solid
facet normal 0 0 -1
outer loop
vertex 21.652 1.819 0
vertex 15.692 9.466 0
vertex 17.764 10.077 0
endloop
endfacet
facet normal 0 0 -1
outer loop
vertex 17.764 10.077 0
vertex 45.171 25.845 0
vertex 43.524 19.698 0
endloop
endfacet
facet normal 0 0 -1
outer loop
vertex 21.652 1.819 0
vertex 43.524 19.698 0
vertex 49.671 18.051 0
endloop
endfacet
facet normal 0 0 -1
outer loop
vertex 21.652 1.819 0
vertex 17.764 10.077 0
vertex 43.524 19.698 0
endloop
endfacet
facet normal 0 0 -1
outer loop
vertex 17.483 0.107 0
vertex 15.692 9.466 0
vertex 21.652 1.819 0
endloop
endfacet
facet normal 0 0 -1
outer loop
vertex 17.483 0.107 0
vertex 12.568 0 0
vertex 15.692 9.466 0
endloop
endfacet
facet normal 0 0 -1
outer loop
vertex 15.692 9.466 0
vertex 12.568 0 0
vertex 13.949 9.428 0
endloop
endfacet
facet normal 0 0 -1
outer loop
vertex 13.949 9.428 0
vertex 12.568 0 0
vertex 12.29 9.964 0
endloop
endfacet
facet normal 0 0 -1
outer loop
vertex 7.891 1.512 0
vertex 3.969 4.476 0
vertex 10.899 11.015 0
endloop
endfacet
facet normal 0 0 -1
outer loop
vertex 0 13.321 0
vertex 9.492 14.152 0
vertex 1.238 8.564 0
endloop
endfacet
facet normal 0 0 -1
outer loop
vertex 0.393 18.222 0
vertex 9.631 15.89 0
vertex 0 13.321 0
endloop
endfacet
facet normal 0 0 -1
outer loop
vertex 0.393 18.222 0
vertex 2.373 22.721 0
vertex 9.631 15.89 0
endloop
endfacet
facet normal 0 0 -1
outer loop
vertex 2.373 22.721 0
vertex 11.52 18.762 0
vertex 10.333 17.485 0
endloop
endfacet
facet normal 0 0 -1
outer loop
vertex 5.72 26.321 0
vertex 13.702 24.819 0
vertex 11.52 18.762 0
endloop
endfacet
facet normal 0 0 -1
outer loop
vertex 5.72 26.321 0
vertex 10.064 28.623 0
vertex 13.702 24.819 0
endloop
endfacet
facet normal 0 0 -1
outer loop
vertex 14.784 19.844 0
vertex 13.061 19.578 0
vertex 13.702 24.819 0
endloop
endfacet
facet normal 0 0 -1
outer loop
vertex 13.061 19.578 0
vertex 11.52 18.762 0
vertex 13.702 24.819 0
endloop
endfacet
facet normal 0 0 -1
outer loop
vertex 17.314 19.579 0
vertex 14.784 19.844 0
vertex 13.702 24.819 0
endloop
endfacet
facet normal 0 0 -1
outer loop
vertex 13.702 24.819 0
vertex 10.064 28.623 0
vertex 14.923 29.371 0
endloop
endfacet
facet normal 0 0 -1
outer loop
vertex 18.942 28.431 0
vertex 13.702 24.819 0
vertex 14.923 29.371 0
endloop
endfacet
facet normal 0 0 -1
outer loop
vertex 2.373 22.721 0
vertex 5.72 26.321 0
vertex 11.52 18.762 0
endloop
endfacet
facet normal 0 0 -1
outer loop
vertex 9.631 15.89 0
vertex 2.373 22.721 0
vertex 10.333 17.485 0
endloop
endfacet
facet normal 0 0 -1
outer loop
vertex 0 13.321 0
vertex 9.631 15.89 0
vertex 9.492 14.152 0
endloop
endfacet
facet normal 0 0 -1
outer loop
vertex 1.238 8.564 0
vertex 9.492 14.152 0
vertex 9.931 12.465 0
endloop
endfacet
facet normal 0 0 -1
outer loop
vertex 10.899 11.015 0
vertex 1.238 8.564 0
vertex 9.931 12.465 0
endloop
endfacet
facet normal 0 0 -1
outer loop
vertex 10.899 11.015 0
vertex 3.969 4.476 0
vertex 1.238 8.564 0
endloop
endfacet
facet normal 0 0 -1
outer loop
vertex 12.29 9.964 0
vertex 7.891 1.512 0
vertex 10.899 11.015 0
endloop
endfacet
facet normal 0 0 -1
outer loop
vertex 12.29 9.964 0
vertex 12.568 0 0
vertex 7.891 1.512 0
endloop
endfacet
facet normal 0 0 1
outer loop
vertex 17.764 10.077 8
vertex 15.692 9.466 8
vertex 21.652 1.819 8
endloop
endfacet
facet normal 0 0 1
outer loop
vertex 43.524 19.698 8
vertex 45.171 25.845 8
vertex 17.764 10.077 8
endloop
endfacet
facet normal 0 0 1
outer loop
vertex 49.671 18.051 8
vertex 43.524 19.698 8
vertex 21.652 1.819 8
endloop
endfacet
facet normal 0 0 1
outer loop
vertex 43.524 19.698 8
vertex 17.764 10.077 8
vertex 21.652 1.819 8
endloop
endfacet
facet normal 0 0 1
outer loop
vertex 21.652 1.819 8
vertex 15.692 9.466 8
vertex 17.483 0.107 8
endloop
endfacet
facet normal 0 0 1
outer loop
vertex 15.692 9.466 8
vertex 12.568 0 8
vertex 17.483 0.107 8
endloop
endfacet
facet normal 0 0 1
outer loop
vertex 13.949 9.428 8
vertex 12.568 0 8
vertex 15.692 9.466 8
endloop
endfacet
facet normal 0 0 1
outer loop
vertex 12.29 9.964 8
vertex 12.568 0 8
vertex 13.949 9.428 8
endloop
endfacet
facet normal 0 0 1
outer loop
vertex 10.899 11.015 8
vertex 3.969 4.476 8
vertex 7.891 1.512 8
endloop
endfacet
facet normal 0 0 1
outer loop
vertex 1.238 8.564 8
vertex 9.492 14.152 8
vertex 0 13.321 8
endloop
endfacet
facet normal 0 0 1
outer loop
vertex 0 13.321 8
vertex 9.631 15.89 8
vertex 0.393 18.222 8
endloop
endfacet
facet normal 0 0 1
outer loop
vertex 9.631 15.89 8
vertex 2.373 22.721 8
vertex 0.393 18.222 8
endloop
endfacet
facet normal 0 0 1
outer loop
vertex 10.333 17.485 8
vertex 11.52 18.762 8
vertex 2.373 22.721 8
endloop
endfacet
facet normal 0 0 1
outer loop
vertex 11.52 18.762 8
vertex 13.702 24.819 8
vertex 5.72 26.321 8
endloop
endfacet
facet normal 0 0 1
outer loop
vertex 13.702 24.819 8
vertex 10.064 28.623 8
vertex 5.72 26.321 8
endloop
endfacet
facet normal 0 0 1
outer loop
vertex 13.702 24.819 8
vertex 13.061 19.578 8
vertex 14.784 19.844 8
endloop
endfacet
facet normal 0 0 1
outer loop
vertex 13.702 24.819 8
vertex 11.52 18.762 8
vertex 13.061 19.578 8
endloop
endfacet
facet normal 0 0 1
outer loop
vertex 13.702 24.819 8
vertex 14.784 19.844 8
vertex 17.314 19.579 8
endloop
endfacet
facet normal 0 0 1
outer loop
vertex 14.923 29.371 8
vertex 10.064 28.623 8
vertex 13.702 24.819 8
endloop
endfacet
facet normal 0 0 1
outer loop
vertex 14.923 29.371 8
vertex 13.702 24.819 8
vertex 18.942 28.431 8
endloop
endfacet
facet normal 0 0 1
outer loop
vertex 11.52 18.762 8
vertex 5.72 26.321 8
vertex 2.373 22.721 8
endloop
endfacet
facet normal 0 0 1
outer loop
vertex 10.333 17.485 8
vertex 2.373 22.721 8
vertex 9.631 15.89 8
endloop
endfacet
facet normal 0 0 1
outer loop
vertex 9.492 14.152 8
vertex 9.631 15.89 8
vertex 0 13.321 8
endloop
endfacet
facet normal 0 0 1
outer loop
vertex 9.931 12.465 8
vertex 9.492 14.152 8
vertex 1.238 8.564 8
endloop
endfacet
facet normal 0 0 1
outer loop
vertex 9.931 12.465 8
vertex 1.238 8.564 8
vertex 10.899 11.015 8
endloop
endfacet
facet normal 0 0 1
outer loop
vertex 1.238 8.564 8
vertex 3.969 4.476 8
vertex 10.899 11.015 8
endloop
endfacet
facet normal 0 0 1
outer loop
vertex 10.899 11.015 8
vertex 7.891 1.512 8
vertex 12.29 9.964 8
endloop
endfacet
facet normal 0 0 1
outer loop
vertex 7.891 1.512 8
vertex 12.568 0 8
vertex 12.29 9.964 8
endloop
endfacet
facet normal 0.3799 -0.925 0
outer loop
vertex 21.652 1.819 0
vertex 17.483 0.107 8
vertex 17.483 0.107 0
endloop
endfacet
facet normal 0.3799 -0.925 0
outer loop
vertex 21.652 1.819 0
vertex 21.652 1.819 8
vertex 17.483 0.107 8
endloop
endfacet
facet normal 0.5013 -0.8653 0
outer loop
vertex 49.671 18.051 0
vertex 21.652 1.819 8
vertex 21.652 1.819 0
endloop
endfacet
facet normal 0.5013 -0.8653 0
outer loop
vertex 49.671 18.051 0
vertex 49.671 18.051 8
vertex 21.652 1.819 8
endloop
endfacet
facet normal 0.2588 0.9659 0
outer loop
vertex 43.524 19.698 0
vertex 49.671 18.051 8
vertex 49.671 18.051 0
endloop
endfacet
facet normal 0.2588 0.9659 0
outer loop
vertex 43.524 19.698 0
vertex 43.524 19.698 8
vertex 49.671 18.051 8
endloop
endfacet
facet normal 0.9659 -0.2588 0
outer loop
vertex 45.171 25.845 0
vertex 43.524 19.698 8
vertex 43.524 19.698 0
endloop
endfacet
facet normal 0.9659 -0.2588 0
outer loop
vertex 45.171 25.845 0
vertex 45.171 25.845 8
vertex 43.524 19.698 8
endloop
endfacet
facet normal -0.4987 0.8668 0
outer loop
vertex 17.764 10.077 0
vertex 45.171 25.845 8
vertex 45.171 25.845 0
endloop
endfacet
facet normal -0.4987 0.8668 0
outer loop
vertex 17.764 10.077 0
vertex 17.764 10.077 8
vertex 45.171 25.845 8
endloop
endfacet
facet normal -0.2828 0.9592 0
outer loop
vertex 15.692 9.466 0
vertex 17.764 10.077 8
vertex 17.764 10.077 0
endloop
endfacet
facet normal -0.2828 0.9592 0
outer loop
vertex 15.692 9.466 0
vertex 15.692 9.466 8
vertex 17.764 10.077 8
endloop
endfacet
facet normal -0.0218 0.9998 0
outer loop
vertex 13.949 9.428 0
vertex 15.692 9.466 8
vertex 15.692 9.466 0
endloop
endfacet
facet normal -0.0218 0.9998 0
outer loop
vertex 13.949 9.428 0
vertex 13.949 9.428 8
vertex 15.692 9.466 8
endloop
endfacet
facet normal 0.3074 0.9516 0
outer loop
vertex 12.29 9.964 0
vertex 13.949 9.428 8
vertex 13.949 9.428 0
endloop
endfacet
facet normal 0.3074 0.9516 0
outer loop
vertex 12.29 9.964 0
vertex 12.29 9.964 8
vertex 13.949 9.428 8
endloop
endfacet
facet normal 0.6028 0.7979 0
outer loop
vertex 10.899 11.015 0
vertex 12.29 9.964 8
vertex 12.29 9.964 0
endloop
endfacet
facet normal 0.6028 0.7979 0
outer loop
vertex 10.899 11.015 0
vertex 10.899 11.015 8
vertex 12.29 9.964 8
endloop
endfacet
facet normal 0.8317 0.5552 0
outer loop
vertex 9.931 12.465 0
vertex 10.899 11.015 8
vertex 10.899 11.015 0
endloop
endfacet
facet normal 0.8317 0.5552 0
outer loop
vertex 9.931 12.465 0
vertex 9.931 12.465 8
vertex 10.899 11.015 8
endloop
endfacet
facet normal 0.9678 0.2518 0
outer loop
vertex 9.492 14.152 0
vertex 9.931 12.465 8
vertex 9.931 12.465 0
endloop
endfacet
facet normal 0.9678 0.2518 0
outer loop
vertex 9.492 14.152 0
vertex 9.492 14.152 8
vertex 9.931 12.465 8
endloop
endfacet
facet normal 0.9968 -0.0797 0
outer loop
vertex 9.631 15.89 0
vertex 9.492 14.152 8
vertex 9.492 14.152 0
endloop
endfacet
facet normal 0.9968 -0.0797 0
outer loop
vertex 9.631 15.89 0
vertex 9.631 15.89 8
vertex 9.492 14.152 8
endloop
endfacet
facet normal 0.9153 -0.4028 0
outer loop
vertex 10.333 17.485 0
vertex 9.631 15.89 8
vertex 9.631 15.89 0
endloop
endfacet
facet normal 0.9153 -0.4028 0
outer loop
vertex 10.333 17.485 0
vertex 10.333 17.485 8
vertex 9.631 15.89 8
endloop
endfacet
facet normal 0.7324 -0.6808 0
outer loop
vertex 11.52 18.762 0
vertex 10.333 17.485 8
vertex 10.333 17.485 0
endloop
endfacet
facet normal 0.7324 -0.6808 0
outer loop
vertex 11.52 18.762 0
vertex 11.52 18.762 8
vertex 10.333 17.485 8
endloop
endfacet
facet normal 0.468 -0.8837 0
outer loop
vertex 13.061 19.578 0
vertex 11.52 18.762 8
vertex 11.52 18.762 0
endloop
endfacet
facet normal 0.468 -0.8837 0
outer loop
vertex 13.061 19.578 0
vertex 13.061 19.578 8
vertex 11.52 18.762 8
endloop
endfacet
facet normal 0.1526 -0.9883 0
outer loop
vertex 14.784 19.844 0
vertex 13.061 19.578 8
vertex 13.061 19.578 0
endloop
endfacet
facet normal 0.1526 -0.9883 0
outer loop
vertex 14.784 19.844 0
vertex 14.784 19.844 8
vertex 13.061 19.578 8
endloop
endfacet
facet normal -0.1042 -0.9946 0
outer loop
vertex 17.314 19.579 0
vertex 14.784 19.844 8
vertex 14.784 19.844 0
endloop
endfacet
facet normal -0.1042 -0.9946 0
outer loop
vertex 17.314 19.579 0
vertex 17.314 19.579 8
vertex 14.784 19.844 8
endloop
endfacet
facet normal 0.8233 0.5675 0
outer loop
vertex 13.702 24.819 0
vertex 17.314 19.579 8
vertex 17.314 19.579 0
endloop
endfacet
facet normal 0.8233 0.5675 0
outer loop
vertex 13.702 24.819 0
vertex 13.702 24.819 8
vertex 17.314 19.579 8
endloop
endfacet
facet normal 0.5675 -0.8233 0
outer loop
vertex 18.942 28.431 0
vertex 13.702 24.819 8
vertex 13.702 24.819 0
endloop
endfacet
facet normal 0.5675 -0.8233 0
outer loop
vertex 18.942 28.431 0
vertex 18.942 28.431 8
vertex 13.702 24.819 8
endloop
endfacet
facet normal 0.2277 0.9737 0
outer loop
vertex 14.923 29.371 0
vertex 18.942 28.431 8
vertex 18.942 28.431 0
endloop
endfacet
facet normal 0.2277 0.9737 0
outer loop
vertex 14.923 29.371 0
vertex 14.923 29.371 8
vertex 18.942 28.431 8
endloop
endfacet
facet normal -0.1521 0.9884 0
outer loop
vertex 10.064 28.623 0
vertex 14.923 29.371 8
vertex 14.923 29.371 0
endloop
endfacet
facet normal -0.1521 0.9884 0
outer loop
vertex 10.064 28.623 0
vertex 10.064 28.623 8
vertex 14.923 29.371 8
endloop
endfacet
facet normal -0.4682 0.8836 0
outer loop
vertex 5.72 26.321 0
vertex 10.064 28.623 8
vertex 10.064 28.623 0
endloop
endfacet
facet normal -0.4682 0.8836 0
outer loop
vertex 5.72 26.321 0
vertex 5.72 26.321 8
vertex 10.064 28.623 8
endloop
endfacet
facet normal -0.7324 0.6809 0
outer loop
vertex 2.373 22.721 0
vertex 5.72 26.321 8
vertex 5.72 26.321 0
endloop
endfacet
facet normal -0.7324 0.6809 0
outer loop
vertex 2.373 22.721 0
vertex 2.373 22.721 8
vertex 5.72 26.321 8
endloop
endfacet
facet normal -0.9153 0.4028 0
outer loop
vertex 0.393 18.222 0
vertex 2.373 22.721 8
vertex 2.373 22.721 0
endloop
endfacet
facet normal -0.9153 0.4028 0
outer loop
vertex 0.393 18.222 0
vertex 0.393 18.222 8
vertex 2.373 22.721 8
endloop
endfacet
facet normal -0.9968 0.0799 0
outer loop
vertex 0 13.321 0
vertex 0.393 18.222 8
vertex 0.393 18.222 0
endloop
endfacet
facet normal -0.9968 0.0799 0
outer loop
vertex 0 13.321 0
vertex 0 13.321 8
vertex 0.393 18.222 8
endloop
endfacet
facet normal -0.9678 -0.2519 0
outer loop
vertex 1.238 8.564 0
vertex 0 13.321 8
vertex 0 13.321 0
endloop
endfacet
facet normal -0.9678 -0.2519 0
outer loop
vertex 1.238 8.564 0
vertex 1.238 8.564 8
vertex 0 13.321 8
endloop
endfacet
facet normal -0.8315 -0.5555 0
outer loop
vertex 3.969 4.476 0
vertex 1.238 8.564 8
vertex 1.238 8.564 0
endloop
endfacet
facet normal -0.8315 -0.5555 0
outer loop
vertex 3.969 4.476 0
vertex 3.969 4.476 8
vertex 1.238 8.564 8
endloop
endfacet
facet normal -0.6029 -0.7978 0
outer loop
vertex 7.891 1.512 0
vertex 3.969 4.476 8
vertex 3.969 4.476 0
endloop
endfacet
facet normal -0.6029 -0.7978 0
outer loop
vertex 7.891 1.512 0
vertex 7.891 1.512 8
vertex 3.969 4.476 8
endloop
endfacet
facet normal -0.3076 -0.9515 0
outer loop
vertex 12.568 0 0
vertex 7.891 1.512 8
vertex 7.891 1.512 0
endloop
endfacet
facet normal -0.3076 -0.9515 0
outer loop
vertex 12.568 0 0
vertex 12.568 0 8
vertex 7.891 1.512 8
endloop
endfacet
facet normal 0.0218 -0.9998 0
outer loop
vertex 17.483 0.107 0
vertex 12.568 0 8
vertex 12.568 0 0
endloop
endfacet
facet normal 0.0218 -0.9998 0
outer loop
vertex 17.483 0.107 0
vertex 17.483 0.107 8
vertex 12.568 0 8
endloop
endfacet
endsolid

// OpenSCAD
$fn = 32;

// ----------------------------------------------------------------------
// Eye lug: ring_tail, 8 mm thick
// ----------------------------------------------------------------------

// --- parameters (mm) ---
profile_height = 8;       // extrusion height
profile_points = 30;      // points of the closed outline

profile = [[13.702, 24.819], [18.942, 28.431], [14.923, 29.371], [10.064, 28.623], [5.72, 26.321], [2.373, 22.721], [0.393, 18.222], [0, 13.321], [1.238, 8.564], [3.969, 4.476], [7.891, 1.512], [12.568, 0], [17.483, 0.107], [21.652, 1.819], [49.671, 18.051], [43.524, 19.698], [45.171, 25.845], [17.764, 10.077], [15.692, 9.466], [13.949, 9.428], [12.29, 9.964], [10.899, 11.015], [9.931, 12.465], [9.492, 14.152], [9.631, 15.89], [10.333, 17.485], [11.52, 18.762], [13.061, 19.578], [14.784, 19.844], [17.314, 19.579]];  // single closed polygon, 30 points, counter clockwise

// --- the one profile operation ---
linear_extrude(height = profile_height) polygon(points = profile);
